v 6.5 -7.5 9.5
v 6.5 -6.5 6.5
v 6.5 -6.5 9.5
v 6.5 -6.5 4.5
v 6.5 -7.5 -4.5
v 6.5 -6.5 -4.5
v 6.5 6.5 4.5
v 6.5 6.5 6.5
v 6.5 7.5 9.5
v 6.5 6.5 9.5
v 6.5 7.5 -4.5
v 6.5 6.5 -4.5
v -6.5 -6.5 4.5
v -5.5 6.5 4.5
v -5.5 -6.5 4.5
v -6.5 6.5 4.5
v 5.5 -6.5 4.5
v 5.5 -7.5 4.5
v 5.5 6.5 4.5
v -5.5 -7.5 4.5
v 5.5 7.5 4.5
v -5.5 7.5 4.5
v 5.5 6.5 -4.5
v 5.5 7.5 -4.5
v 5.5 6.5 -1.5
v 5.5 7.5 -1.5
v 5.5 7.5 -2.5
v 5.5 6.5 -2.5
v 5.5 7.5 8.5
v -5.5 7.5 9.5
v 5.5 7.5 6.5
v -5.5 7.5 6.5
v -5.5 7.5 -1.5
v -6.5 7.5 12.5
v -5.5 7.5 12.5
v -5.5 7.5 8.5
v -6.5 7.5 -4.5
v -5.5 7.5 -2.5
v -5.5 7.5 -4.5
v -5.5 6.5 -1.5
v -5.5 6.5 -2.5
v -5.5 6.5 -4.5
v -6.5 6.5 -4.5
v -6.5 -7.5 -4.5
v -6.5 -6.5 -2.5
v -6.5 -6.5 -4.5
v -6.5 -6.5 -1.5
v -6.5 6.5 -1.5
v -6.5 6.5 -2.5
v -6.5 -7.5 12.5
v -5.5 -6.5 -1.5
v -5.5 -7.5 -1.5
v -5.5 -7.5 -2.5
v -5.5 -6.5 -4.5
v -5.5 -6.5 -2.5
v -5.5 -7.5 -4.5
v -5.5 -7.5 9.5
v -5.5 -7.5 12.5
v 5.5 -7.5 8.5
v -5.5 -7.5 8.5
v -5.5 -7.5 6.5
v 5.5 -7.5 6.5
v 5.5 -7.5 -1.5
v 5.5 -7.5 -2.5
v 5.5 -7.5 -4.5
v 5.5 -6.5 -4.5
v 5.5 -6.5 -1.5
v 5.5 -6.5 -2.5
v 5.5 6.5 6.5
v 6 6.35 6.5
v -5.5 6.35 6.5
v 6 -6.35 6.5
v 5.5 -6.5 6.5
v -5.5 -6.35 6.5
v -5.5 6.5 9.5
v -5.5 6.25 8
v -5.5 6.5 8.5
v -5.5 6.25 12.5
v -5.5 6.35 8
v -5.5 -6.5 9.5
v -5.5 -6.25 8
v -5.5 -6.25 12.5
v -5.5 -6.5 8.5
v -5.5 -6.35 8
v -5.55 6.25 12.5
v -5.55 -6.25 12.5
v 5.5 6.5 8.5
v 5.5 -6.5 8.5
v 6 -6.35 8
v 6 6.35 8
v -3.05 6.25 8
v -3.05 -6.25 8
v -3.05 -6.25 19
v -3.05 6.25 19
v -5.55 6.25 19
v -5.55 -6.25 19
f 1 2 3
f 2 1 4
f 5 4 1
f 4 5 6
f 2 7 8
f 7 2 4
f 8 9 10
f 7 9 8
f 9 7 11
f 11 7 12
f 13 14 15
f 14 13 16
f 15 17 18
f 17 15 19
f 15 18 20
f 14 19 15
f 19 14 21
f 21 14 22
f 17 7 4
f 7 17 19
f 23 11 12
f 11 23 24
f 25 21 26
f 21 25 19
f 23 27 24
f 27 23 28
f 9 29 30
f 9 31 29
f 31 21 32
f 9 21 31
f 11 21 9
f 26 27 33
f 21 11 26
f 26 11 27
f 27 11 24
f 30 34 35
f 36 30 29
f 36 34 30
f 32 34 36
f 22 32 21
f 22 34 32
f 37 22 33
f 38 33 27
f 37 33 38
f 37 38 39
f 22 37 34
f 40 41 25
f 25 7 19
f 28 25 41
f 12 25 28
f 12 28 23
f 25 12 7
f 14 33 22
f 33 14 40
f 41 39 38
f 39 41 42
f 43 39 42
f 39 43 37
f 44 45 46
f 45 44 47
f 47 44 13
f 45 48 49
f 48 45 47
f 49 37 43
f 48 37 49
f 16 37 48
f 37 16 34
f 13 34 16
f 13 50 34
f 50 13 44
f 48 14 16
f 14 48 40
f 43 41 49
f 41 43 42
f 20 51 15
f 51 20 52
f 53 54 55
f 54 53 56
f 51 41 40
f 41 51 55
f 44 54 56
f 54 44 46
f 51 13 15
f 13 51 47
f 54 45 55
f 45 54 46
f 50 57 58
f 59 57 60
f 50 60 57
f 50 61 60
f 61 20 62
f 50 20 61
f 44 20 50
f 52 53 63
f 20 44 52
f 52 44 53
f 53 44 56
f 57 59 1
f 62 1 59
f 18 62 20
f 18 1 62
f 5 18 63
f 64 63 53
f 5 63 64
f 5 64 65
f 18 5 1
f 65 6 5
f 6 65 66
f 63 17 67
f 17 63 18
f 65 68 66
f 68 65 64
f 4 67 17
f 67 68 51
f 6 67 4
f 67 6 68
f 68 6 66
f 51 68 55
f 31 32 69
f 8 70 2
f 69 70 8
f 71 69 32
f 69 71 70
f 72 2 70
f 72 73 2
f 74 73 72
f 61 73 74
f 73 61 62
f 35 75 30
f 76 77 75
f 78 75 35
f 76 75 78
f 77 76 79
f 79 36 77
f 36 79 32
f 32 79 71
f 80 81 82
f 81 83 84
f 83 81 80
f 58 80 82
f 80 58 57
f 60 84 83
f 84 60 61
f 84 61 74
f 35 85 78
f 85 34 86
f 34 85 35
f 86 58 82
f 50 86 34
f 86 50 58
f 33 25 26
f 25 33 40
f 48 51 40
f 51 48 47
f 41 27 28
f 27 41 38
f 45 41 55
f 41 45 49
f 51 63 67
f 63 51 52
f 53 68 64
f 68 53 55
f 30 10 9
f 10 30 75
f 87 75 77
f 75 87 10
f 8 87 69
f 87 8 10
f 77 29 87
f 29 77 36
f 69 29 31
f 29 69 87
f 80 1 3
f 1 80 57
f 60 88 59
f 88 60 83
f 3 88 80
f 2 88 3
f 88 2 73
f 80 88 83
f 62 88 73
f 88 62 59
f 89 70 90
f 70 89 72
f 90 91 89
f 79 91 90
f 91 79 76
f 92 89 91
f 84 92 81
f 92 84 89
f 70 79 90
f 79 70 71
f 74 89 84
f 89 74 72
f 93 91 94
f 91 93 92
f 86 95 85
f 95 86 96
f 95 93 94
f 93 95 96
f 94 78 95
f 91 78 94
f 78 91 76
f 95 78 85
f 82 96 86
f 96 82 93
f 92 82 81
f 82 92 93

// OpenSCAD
// Angelo Nicolì 2023 - Licensed GPL-2.0

// Modify Input DATA to change the shape of the chair


// INPUT DATA

Table_Leg = [1,1,9];      // lenght, width and height of legs
Table_Top_Height = 2;     //  Height of theSeat

Leg_Distance_x = 12;        
Leg_Distance_y = 14;     

seat_height = 6;         // Backpost size 
seat_width = 1;           // Backpost width (x axis)


// OUTPUT DATA

translate([Leg_Distance_x*0.5,Leg_Distance_y*0.5,0])
color("#82490b")
cube([Table_Leg[0],Table_Leg[1],Table_Leg[2]],center=true);

translate([-Leg_Distance_x*0.5,Leg_Distance_y*0.5,0])
color("#82490b")
cube([Table_Leg[0],Table_Leg[1],Table_Leg[2]],center=true);

translate([-Leg_Distance_x*0.5,-Leg_Distance_y*0.5,0])
color("#82490b")
cube([Table_Leg[0],Table_Leg[1],Table_Leg[2]],center=true);

translate([Leg_Distance_x*0.5,-Leg_Distance_y*0.5,0])
color("#82490b")
cube([Table_Leg[0],Table_Leg[1],Table_Leg[2]],center=true);

Table_Upper = [Leg_Distance_x + Table_Leg[0],Leg_Distance_y +Table_Leg[1],Table_Top_Height];

seat = [seat_width,Leg_Distance_y+Table_Leg[1],seat_height];

translate([0,0,Table_Leg[2]*0.5+Table_Top_Height*0.5])
color("#82490b")
cube([Table_Upper[0],Table_Upper[1],Table_Upper[2]],center=true);

translate([-Table_Upper[0]*0.5+seat[0]*0.5,0,Table_Leg[2]*0.5+Table_Top_Height+seat_height*0.5])
color("#82490b")
cube([seat[0],seat[1],seat[2]],center=true);

rotate([0,0,90])
translate([7,0,-2])
color("#82490b")
cube([1,12,1],center=true);


rotate([0,0,90])
translate([-7,0,-2])
color("#82490b")
cube([1,12,1],center=true);


rotate([0,0,0])
translate([-6,0,-2])
color("#82490b")
cube([1,14,1],center=true);

rotate([0,0,90])
translate([7,0,9])
color("#82490b")
cube([1,12,1],center=true);

rotate([90,0,0])
translate([6,7.5,-7])
color("#82490b")
cube([1,4,1],center=true);

rotate([0,0,90])
translate([-7,0,9])
color("#82490b")
cube([1,12,1],center=true);

rotate([90,0,0])
translate([6,7.5,7])
color("#82490b")
cube([1,4,1],center=true);


translate([0,0,7])
color("#F4FFFF")
cube([12,12.7,2],center=true);

translate([-4.3,0,13])
rotate([0,90,0])
color("#F4FFFF")
cube([12,12.5,2.5],center=true);
